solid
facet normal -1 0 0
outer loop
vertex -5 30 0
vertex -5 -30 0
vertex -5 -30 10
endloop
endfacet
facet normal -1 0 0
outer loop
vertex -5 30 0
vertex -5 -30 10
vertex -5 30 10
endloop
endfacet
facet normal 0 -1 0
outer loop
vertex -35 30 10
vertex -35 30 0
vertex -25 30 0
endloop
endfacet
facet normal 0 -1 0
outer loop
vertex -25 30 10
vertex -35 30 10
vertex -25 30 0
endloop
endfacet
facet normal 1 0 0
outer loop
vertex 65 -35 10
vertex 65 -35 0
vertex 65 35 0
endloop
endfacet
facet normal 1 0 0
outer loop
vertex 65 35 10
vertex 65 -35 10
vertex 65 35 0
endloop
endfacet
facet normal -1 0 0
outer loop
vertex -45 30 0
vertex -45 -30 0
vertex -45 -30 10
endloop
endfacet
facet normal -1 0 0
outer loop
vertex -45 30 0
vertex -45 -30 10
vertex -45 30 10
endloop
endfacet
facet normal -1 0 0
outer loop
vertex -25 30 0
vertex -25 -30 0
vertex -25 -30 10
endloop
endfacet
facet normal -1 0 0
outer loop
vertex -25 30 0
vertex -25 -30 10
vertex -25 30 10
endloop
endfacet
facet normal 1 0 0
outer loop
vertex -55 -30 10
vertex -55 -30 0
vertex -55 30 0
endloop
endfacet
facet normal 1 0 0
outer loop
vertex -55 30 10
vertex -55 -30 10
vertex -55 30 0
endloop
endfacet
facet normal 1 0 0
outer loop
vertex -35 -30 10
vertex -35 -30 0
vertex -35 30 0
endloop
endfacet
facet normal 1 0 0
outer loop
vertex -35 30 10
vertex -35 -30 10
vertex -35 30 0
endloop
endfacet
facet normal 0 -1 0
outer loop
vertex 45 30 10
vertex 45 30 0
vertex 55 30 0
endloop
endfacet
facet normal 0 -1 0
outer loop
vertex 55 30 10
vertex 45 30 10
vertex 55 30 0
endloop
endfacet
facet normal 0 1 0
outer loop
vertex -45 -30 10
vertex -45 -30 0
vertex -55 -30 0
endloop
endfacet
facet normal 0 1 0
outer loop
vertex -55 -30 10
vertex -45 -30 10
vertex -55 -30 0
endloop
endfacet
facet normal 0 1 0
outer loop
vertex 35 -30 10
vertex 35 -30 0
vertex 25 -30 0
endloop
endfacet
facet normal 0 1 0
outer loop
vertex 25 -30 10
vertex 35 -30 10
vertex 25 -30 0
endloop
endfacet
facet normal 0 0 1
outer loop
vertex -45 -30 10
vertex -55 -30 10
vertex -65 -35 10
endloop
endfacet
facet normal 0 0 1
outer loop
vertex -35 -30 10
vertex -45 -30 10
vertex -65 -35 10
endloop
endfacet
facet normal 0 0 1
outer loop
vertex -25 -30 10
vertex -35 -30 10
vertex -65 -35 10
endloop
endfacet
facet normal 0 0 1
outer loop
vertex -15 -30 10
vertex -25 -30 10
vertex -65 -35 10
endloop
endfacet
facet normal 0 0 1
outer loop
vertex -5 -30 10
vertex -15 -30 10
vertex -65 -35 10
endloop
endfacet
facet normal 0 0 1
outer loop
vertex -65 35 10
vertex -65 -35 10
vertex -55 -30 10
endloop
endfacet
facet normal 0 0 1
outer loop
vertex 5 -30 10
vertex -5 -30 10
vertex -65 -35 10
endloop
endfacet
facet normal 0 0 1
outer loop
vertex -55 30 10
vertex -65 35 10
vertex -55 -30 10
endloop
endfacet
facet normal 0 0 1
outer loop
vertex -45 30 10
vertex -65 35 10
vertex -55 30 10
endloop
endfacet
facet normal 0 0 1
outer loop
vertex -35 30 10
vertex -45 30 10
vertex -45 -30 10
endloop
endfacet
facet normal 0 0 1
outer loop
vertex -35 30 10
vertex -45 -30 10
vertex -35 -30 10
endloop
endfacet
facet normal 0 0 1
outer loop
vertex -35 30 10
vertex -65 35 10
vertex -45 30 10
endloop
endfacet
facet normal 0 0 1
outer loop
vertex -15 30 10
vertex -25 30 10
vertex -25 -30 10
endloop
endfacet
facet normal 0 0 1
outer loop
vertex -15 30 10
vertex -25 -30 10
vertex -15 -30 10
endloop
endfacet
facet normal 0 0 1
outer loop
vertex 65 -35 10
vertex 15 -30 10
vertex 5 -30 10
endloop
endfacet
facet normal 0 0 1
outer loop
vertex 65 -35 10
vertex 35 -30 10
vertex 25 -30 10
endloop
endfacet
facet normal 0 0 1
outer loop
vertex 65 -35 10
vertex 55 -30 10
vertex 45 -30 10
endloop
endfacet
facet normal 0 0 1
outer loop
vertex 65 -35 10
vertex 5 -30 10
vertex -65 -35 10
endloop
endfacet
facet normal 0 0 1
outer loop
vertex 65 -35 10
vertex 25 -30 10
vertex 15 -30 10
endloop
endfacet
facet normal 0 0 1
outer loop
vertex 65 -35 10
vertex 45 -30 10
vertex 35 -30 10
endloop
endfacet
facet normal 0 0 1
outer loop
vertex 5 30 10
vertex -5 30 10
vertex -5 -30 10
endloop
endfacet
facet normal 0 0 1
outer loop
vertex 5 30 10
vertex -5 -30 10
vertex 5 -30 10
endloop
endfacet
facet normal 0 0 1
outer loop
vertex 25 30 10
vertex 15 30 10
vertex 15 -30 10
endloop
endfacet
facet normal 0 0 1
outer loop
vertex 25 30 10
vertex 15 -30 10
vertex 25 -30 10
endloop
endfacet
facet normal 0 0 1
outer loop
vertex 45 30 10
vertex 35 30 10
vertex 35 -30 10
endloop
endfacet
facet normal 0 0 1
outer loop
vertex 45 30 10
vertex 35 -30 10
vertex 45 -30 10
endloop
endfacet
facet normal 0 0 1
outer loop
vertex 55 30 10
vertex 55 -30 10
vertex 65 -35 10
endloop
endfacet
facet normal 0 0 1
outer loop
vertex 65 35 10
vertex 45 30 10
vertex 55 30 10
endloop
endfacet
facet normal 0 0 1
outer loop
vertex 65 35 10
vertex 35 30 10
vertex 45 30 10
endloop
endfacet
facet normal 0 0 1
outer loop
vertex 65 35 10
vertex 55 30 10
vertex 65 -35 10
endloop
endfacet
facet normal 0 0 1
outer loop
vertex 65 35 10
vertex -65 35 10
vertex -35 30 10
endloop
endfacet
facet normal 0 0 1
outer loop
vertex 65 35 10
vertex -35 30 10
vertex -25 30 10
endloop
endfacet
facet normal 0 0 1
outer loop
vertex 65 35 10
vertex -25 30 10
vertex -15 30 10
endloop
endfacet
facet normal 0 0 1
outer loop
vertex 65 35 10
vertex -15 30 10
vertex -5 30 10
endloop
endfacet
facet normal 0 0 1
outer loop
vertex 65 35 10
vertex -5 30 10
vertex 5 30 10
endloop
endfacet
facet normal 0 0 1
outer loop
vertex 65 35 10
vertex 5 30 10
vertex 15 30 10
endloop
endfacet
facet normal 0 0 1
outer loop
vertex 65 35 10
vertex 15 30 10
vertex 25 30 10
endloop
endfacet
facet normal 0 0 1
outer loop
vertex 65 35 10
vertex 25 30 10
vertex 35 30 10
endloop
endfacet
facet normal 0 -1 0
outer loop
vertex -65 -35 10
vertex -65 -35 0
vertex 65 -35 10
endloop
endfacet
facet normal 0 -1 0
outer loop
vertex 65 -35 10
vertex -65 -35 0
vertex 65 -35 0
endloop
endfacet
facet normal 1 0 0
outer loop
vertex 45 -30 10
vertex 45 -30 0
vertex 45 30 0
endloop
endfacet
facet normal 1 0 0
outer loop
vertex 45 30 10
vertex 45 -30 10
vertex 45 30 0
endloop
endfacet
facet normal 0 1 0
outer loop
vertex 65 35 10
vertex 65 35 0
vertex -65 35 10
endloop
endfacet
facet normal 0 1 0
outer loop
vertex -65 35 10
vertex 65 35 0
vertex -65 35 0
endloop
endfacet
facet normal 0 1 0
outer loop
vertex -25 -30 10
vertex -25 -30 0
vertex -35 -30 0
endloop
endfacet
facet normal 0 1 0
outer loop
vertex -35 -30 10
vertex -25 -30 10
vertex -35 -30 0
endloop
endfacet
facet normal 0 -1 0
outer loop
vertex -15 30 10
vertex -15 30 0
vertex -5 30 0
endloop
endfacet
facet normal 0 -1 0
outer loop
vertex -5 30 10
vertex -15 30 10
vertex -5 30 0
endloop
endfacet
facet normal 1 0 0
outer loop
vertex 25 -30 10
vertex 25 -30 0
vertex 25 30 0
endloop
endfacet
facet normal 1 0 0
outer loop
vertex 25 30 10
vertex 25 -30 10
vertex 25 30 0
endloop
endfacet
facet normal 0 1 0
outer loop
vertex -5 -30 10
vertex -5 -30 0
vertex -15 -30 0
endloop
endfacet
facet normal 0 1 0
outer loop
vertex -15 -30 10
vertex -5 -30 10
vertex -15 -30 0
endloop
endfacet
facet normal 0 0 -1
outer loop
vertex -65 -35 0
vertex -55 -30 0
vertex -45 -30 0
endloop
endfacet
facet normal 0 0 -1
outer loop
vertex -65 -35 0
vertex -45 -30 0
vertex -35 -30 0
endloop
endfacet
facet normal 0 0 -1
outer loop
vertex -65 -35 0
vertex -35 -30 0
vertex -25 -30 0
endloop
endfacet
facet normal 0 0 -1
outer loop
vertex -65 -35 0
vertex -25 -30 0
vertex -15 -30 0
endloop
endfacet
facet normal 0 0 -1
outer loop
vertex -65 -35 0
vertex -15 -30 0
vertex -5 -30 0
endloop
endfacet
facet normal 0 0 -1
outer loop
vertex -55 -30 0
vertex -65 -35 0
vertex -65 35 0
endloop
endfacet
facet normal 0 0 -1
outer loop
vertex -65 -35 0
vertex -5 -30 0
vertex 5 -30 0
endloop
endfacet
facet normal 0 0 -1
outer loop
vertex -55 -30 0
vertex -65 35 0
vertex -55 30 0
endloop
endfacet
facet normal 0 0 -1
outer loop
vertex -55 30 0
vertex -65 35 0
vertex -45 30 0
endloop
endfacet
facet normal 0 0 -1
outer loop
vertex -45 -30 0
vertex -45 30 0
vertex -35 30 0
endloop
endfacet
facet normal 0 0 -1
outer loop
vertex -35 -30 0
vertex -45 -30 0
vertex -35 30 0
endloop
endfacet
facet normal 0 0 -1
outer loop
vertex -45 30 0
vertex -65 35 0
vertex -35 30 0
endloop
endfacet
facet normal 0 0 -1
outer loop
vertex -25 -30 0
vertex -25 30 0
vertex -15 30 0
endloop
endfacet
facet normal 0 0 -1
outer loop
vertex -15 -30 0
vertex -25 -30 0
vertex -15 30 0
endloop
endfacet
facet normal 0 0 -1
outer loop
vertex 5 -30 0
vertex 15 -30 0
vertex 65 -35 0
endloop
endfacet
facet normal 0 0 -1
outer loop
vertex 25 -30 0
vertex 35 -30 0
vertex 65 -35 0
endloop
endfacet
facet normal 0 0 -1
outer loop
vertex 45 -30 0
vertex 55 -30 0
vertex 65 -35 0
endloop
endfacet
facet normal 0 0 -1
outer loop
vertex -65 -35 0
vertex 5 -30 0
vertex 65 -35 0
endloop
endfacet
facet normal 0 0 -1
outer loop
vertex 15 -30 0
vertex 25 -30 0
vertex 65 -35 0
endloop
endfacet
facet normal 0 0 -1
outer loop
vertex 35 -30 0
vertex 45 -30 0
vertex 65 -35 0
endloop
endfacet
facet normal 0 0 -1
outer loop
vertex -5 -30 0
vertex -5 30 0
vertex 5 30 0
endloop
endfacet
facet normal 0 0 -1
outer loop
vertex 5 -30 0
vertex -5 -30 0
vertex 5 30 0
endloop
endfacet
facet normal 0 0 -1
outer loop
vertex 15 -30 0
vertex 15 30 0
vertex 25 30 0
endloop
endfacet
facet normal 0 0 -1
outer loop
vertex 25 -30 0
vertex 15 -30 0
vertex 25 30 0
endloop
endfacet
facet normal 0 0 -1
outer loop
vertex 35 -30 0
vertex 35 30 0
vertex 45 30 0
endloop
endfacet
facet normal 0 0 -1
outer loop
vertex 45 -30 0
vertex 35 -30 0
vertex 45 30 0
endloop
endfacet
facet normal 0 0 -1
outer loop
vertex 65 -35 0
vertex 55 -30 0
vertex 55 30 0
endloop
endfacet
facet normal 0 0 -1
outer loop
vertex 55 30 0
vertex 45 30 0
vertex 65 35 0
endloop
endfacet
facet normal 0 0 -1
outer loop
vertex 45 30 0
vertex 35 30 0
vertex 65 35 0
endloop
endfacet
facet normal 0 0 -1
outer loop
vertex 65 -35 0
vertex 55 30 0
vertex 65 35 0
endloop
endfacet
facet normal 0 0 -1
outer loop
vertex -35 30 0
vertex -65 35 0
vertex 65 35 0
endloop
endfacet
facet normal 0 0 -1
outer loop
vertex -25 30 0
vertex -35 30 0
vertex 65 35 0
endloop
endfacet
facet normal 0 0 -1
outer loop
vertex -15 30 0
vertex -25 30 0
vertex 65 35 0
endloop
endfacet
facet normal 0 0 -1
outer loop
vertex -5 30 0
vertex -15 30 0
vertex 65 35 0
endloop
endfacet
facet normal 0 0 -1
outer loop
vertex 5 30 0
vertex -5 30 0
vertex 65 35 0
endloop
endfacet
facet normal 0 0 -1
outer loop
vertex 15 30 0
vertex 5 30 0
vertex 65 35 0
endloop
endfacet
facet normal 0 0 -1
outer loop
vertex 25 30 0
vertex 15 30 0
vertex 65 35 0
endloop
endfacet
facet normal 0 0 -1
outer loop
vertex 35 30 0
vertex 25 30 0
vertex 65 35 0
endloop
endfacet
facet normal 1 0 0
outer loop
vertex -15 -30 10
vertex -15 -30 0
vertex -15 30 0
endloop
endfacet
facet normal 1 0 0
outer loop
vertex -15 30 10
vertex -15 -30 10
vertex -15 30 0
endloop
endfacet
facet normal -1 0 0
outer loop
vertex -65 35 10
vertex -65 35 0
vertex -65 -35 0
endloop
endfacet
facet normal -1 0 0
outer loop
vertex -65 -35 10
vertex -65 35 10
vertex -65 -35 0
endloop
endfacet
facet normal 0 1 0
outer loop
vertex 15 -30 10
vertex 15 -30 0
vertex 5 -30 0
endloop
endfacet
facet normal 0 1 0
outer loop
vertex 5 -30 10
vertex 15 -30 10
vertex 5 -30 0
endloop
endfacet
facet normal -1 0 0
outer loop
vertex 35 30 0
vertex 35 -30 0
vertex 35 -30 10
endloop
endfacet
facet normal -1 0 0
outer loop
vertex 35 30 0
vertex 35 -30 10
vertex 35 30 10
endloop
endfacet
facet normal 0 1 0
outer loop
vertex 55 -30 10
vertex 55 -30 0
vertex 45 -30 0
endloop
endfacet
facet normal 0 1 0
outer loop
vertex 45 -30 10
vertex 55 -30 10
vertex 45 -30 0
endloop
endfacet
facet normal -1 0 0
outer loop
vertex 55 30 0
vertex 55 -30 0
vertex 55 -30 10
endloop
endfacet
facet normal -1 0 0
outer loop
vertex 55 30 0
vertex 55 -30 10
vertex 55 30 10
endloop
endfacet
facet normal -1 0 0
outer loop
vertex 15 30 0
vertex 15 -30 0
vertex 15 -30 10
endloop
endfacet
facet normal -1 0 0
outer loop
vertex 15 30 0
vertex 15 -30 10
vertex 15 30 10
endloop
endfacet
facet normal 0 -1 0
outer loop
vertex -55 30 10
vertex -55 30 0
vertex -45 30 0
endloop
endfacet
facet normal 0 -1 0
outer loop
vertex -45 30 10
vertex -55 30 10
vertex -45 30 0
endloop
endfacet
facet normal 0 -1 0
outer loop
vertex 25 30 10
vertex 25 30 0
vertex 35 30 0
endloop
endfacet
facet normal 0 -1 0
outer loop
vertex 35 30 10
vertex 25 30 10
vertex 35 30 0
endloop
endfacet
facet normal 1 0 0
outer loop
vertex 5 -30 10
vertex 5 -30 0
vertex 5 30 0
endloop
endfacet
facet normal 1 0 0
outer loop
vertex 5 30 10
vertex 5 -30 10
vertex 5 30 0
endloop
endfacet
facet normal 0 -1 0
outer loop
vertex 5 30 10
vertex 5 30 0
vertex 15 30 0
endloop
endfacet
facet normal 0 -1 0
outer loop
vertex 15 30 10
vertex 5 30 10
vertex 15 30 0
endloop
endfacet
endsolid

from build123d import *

# Parameters (mm, degrees)
F0_W     = 10
F0_H     = 60
F1_DEPTH = 10


with BuildPart() as f1:
    # F0 (on Top) → F1 (new body)
    with BuildSketch(Plane.XY):
        with Locations((-60, 0)):
            Rectangle(F0_W, F0_H)
        with Locations((-40, 0)):
            Rectangle(F0_W, F0_H)
        Polygon((65, 30), (65, 35), (-65, 35), (-65, 30), (-55, 30), (-45, 30), (-35, 30), (-25, 30), (-15, 30), (-5, 30), (5, 30), (15, 30), (25, 30), (35, 30), (45, 30), (55, 30), align=None)
        with Locations((-20, 0)):
            Rectangle(F0_W, F0_H)
        Rectangle(F0_W, F0_H)
        with Locations((20, 0)):
            Rectangle(F0_W, F0_H)
        with Locations((40, 0)):
            Rectangle(F0_W, F0_H)
        with Locations((60, 0)):
            Rectangle(F0_W, F0_H)
        Polygon((65, -35), (65, -30), (55, -30), (45, -30), (35, -30), (25, -30), (15, -30), (5, -30), (-5, -30), (-15, -30), (-25, -30), (-35, -30), (-45, -30), (-55, -30), (-65, -30), (-65, -35), align=None)
    extrude(amount=F1_DEPTH)


solid = f1.part
